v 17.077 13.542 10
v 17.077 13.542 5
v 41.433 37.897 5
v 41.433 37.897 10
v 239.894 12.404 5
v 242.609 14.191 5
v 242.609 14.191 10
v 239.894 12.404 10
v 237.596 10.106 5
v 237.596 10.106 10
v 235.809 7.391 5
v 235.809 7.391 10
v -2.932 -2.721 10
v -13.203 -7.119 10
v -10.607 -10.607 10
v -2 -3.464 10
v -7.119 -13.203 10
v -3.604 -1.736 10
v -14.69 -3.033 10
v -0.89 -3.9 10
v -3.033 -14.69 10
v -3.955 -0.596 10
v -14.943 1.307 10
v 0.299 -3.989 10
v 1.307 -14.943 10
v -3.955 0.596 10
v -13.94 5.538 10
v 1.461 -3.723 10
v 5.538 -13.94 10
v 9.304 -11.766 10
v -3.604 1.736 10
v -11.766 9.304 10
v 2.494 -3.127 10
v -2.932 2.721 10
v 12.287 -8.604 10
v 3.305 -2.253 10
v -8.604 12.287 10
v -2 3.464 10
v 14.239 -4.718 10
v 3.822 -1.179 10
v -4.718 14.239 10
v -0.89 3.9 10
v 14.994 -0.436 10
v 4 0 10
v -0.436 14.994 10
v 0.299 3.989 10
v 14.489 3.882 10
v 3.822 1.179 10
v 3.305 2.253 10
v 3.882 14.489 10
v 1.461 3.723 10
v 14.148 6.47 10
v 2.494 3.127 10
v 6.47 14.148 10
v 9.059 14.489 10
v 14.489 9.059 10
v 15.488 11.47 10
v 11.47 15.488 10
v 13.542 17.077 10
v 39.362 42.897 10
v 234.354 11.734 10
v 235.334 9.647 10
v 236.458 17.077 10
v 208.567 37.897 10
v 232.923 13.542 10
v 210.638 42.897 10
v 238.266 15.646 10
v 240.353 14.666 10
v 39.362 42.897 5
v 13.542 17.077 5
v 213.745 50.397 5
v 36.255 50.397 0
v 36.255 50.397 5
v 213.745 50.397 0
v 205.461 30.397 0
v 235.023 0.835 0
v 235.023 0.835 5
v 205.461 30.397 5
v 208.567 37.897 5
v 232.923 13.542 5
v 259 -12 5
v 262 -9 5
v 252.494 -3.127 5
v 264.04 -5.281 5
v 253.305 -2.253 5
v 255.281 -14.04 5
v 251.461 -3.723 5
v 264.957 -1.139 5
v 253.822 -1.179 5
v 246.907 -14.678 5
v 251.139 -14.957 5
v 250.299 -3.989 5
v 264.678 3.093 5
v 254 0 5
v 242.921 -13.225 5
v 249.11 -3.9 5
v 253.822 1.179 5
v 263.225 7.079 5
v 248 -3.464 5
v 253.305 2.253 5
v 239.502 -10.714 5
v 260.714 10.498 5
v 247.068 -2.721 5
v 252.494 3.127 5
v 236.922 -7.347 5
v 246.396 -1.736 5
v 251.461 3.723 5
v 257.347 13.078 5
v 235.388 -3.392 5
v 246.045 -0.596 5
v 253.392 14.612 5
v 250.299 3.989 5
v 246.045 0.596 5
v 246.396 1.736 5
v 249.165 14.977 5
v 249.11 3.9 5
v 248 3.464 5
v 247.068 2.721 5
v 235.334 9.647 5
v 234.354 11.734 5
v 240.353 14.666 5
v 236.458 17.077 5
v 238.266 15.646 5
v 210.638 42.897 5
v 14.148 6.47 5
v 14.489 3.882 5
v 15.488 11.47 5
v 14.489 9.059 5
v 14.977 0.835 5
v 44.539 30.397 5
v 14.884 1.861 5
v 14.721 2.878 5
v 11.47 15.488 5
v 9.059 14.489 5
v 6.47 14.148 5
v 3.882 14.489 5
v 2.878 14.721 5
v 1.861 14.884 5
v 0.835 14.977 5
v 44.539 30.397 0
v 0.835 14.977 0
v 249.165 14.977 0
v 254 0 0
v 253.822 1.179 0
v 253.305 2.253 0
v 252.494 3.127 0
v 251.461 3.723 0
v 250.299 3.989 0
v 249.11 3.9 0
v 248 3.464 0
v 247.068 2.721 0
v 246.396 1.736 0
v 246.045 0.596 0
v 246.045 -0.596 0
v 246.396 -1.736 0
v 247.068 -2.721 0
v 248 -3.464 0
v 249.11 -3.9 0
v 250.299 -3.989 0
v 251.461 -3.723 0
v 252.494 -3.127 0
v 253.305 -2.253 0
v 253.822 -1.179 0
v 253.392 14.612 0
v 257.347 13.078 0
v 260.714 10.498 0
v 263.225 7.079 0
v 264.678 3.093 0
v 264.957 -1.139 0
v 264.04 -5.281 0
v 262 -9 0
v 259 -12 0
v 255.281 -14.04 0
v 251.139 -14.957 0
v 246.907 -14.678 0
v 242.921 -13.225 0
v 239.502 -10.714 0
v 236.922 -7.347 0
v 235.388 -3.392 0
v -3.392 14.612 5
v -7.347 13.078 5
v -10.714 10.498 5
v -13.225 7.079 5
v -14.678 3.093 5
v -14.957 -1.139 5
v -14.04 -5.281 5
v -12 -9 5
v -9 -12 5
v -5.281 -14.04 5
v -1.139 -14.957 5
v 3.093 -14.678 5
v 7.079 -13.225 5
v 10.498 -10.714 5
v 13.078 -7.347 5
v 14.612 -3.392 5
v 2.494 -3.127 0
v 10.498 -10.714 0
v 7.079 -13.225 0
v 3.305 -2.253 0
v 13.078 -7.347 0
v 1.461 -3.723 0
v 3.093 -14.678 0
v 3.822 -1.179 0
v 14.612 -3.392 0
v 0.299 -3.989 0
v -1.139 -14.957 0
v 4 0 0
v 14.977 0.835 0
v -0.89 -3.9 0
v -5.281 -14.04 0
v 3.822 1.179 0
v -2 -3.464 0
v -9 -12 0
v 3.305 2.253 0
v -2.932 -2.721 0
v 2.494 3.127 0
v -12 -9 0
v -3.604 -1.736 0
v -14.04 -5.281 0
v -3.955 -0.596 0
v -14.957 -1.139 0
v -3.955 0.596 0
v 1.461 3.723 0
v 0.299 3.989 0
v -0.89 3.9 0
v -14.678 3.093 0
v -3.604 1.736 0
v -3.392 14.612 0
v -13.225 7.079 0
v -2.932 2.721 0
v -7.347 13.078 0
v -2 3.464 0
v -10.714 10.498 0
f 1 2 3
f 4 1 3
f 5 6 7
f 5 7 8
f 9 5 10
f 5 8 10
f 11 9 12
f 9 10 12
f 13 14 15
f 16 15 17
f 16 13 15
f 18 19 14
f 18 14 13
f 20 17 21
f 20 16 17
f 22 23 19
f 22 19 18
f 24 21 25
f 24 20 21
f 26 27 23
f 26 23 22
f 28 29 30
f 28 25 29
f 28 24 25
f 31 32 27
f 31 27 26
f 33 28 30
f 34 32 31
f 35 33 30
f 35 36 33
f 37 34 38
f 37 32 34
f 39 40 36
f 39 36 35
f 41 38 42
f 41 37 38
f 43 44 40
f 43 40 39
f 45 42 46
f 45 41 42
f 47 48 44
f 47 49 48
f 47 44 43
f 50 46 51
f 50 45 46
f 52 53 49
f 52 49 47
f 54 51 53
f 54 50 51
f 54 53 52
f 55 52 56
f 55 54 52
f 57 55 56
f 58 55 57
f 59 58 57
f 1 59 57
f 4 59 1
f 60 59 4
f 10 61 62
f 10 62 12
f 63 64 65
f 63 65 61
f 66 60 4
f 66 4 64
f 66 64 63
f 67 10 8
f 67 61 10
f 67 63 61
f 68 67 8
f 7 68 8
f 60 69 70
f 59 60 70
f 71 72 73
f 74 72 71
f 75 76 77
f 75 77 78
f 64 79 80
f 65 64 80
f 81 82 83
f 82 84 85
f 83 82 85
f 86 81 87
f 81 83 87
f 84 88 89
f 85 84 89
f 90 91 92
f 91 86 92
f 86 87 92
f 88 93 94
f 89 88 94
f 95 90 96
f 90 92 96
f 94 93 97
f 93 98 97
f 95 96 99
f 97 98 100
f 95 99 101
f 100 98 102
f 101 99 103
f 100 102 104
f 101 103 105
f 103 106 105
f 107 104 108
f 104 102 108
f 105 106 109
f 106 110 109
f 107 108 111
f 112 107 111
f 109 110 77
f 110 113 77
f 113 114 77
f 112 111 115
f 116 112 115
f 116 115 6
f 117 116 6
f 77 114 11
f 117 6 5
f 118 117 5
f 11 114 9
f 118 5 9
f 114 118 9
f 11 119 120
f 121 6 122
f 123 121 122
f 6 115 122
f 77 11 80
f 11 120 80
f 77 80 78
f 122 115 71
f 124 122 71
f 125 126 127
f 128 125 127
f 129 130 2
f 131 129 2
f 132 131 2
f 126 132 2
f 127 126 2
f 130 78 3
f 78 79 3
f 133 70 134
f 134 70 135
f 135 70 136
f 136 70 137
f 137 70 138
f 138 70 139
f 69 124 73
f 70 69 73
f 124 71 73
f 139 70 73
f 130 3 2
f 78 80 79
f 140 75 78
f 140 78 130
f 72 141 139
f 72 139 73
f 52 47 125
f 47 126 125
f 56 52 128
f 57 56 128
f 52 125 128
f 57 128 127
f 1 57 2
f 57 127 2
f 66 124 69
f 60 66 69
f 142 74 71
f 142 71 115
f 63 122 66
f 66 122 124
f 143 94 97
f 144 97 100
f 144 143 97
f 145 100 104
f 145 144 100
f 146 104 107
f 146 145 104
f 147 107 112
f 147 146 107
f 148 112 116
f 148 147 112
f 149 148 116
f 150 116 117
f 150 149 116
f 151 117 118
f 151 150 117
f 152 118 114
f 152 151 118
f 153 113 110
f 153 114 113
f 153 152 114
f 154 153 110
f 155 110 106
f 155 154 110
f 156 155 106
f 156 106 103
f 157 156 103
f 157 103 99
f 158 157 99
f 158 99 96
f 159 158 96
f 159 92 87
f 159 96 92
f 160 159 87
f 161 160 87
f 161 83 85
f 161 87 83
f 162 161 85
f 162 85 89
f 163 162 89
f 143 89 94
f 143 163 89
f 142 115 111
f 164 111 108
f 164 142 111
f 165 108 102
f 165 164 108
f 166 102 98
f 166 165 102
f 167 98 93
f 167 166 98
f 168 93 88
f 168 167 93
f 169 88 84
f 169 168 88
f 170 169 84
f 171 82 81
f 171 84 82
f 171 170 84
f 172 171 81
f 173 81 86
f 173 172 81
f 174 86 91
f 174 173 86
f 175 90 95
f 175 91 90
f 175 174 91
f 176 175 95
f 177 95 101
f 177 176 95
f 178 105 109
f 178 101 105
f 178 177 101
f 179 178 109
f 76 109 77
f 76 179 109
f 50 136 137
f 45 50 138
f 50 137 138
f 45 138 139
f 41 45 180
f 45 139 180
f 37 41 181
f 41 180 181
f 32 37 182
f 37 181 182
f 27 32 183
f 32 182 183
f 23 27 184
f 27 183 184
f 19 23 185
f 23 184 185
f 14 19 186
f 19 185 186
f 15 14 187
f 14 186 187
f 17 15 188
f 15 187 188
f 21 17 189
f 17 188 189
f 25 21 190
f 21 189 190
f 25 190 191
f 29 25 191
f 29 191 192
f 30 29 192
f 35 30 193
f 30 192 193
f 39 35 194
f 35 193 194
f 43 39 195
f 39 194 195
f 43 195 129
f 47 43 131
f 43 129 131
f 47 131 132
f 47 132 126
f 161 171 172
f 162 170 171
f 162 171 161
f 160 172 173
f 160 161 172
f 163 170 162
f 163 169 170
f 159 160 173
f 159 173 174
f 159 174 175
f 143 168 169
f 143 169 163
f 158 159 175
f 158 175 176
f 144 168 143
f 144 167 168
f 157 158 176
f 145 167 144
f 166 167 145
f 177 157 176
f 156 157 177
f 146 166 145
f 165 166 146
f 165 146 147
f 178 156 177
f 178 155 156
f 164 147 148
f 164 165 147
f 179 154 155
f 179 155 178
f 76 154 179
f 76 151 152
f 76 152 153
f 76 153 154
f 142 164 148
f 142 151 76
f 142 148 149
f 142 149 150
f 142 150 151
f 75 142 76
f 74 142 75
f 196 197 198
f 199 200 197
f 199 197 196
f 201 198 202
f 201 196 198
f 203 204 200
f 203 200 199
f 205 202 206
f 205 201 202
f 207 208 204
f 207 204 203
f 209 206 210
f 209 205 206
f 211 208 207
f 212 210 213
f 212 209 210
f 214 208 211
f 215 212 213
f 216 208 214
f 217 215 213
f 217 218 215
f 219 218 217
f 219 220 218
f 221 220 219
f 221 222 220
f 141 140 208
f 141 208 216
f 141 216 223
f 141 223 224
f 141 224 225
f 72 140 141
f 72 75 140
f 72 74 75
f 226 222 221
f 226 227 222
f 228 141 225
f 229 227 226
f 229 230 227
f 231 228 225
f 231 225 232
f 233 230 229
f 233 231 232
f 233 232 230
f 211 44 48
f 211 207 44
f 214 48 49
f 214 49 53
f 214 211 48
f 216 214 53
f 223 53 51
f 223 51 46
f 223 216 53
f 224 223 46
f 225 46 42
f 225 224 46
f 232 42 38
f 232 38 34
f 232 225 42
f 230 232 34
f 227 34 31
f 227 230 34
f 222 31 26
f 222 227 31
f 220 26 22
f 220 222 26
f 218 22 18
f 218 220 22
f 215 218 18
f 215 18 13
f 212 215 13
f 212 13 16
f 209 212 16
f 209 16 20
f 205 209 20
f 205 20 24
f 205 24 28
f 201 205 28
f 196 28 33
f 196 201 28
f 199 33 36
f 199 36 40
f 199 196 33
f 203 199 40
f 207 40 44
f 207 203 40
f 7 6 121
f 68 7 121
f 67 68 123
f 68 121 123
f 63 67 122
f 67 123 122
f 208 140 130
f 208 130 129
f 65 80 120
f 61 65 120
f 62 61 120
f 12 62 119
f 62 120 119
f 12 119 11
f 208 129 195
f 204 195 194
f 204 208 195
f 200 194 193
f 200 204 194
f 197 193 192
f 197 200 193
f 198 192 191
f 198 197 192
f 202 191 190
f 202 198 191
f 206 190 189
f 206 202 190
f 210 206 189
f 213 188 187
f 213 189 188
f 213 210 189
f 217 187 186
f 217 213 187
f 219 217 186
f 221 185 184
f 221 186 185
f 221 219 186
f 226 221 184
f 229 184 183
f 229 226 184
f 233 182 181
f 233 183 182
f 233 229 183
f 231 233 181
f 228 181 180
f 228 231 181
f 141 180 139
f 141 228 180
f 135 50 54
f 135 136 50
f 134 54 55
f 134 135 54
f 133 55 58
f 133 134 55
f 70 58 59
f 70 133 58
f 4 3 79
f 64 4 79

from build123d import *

# Parameters (mm, degrees)
SKETCH1_R             = 4
BOSS_EXTRUDE1_DEPTH   = 5
BOSS_EXTRUDE2_DEPTH   = 5
SKETCH7_R             = 15
SKETCH7_R_2           = 4
BOSS_EXTRUDE3_DEPTH   = 5
FILLET1_R             = 10
IZIM1_R               = 16
KES_EKSTR_ZYON1_DEPTH = 5


with BuildPart() as part:
    # Sketch1 → Boss-Extrude1 (new body)
    with BuildSketch(Plane.XY):
        with BuildLine():
            Line((44.539250231, 30.397114607), (14.976761962, 0.834626339))
            ThreePointArc((14.976761962, 0.834626339), (-10.606601718, -10.606601718), (0.834626339, 14.976761962))
            Line((0.834626339, 14.976761962), (36.254978983, 50.397114607))
            Line((36.254978983, 50.397114607), (213.745021017, 50.397114607))
            Line((213.745021017, 50.397114607), (249.165373661, 14.976761962))
            ThreePointArc((249.165373661, 14.976761962), (260.606601718, -10.606601718), (235.023238038, 0.834626339))
            Line((235.023238038, 0.834626339), (205.460749769, 30.397114607))
            Line((205.460749769, 30.397114607), (44.539250231, 30.397114607))
        make_face()
        Circle(SKETCH1_R, mode=Mode.SUBTRACT)
        with Locations((250, 0)):
            Circle(SKETCH1_R, mode=Mode.SUBTRACT)
    extrude(amount=BOSS_EXTRUDE1_DEPTH)

    # Sketch6 → Boss-Extrude2 (add)
    with BuildSketch(Plane.XY.offset(5)):
        Polygon((243.862072803, 9.673461103), (210.638419299, 42.897114607), (39.361580701, 42.897114607), (6.137927197, 9.673461103), (9.673461103, 6.137927197), (41.432648513, 37.897114607), (208.567351487, 37.897114607), (240.326538897, 6.137927197), align=None)
    extrude(amount=BOSS_EXTRUDE2_DEPTH)

    # Sketch7 → Boss-Extrude3 (add)
    # profile 1 of 2: a face of its own
    with BuildSketch(Plane.XY.offset(5)):
        Circle(SKETCH7_R)
        Circle(SKETCH7_R_2, mode=Mode.SUBTRACT)
    # profile 2 of 2: a face of its own
    with BuildSketch(Plane.XY.offset(5)):
        with Locations((250, 0)):
            Circle(SKETCH7_R)
        with Locations((250, 0)):
            Circle(SKETCH7_R_2, mode=Mode.SUBTRACT)
    extrude(amount=BOSS_EXTRUDE3_DEPTH)

    # Fillet1
    fillet1_edges = [part.edges().sort_by_distance(p)[0] for p in [
        (8.690483379, 12.226017285, 7.5),
        (12.226017285, 8.690483379, 7.5),
        (241.309516621, 12.226017285, 7.5),
        (237.773982715, 8.690483379, 7.5),
    ]]
    fillet(fillet1_edges, radius=FILLET1_R)

    # Çizim1 → Kes-Ekstrüzyon1 (cut)
    with BuildSketch(Plane.XY.offset(10)):
        with Locations((250, 0)):
            Circle(IZIM1_R)
    extrude(amount=-KES_EKSTR_ZYON1_DEPTH, mode=Mode.SUBTRACT)


solid = part.part
